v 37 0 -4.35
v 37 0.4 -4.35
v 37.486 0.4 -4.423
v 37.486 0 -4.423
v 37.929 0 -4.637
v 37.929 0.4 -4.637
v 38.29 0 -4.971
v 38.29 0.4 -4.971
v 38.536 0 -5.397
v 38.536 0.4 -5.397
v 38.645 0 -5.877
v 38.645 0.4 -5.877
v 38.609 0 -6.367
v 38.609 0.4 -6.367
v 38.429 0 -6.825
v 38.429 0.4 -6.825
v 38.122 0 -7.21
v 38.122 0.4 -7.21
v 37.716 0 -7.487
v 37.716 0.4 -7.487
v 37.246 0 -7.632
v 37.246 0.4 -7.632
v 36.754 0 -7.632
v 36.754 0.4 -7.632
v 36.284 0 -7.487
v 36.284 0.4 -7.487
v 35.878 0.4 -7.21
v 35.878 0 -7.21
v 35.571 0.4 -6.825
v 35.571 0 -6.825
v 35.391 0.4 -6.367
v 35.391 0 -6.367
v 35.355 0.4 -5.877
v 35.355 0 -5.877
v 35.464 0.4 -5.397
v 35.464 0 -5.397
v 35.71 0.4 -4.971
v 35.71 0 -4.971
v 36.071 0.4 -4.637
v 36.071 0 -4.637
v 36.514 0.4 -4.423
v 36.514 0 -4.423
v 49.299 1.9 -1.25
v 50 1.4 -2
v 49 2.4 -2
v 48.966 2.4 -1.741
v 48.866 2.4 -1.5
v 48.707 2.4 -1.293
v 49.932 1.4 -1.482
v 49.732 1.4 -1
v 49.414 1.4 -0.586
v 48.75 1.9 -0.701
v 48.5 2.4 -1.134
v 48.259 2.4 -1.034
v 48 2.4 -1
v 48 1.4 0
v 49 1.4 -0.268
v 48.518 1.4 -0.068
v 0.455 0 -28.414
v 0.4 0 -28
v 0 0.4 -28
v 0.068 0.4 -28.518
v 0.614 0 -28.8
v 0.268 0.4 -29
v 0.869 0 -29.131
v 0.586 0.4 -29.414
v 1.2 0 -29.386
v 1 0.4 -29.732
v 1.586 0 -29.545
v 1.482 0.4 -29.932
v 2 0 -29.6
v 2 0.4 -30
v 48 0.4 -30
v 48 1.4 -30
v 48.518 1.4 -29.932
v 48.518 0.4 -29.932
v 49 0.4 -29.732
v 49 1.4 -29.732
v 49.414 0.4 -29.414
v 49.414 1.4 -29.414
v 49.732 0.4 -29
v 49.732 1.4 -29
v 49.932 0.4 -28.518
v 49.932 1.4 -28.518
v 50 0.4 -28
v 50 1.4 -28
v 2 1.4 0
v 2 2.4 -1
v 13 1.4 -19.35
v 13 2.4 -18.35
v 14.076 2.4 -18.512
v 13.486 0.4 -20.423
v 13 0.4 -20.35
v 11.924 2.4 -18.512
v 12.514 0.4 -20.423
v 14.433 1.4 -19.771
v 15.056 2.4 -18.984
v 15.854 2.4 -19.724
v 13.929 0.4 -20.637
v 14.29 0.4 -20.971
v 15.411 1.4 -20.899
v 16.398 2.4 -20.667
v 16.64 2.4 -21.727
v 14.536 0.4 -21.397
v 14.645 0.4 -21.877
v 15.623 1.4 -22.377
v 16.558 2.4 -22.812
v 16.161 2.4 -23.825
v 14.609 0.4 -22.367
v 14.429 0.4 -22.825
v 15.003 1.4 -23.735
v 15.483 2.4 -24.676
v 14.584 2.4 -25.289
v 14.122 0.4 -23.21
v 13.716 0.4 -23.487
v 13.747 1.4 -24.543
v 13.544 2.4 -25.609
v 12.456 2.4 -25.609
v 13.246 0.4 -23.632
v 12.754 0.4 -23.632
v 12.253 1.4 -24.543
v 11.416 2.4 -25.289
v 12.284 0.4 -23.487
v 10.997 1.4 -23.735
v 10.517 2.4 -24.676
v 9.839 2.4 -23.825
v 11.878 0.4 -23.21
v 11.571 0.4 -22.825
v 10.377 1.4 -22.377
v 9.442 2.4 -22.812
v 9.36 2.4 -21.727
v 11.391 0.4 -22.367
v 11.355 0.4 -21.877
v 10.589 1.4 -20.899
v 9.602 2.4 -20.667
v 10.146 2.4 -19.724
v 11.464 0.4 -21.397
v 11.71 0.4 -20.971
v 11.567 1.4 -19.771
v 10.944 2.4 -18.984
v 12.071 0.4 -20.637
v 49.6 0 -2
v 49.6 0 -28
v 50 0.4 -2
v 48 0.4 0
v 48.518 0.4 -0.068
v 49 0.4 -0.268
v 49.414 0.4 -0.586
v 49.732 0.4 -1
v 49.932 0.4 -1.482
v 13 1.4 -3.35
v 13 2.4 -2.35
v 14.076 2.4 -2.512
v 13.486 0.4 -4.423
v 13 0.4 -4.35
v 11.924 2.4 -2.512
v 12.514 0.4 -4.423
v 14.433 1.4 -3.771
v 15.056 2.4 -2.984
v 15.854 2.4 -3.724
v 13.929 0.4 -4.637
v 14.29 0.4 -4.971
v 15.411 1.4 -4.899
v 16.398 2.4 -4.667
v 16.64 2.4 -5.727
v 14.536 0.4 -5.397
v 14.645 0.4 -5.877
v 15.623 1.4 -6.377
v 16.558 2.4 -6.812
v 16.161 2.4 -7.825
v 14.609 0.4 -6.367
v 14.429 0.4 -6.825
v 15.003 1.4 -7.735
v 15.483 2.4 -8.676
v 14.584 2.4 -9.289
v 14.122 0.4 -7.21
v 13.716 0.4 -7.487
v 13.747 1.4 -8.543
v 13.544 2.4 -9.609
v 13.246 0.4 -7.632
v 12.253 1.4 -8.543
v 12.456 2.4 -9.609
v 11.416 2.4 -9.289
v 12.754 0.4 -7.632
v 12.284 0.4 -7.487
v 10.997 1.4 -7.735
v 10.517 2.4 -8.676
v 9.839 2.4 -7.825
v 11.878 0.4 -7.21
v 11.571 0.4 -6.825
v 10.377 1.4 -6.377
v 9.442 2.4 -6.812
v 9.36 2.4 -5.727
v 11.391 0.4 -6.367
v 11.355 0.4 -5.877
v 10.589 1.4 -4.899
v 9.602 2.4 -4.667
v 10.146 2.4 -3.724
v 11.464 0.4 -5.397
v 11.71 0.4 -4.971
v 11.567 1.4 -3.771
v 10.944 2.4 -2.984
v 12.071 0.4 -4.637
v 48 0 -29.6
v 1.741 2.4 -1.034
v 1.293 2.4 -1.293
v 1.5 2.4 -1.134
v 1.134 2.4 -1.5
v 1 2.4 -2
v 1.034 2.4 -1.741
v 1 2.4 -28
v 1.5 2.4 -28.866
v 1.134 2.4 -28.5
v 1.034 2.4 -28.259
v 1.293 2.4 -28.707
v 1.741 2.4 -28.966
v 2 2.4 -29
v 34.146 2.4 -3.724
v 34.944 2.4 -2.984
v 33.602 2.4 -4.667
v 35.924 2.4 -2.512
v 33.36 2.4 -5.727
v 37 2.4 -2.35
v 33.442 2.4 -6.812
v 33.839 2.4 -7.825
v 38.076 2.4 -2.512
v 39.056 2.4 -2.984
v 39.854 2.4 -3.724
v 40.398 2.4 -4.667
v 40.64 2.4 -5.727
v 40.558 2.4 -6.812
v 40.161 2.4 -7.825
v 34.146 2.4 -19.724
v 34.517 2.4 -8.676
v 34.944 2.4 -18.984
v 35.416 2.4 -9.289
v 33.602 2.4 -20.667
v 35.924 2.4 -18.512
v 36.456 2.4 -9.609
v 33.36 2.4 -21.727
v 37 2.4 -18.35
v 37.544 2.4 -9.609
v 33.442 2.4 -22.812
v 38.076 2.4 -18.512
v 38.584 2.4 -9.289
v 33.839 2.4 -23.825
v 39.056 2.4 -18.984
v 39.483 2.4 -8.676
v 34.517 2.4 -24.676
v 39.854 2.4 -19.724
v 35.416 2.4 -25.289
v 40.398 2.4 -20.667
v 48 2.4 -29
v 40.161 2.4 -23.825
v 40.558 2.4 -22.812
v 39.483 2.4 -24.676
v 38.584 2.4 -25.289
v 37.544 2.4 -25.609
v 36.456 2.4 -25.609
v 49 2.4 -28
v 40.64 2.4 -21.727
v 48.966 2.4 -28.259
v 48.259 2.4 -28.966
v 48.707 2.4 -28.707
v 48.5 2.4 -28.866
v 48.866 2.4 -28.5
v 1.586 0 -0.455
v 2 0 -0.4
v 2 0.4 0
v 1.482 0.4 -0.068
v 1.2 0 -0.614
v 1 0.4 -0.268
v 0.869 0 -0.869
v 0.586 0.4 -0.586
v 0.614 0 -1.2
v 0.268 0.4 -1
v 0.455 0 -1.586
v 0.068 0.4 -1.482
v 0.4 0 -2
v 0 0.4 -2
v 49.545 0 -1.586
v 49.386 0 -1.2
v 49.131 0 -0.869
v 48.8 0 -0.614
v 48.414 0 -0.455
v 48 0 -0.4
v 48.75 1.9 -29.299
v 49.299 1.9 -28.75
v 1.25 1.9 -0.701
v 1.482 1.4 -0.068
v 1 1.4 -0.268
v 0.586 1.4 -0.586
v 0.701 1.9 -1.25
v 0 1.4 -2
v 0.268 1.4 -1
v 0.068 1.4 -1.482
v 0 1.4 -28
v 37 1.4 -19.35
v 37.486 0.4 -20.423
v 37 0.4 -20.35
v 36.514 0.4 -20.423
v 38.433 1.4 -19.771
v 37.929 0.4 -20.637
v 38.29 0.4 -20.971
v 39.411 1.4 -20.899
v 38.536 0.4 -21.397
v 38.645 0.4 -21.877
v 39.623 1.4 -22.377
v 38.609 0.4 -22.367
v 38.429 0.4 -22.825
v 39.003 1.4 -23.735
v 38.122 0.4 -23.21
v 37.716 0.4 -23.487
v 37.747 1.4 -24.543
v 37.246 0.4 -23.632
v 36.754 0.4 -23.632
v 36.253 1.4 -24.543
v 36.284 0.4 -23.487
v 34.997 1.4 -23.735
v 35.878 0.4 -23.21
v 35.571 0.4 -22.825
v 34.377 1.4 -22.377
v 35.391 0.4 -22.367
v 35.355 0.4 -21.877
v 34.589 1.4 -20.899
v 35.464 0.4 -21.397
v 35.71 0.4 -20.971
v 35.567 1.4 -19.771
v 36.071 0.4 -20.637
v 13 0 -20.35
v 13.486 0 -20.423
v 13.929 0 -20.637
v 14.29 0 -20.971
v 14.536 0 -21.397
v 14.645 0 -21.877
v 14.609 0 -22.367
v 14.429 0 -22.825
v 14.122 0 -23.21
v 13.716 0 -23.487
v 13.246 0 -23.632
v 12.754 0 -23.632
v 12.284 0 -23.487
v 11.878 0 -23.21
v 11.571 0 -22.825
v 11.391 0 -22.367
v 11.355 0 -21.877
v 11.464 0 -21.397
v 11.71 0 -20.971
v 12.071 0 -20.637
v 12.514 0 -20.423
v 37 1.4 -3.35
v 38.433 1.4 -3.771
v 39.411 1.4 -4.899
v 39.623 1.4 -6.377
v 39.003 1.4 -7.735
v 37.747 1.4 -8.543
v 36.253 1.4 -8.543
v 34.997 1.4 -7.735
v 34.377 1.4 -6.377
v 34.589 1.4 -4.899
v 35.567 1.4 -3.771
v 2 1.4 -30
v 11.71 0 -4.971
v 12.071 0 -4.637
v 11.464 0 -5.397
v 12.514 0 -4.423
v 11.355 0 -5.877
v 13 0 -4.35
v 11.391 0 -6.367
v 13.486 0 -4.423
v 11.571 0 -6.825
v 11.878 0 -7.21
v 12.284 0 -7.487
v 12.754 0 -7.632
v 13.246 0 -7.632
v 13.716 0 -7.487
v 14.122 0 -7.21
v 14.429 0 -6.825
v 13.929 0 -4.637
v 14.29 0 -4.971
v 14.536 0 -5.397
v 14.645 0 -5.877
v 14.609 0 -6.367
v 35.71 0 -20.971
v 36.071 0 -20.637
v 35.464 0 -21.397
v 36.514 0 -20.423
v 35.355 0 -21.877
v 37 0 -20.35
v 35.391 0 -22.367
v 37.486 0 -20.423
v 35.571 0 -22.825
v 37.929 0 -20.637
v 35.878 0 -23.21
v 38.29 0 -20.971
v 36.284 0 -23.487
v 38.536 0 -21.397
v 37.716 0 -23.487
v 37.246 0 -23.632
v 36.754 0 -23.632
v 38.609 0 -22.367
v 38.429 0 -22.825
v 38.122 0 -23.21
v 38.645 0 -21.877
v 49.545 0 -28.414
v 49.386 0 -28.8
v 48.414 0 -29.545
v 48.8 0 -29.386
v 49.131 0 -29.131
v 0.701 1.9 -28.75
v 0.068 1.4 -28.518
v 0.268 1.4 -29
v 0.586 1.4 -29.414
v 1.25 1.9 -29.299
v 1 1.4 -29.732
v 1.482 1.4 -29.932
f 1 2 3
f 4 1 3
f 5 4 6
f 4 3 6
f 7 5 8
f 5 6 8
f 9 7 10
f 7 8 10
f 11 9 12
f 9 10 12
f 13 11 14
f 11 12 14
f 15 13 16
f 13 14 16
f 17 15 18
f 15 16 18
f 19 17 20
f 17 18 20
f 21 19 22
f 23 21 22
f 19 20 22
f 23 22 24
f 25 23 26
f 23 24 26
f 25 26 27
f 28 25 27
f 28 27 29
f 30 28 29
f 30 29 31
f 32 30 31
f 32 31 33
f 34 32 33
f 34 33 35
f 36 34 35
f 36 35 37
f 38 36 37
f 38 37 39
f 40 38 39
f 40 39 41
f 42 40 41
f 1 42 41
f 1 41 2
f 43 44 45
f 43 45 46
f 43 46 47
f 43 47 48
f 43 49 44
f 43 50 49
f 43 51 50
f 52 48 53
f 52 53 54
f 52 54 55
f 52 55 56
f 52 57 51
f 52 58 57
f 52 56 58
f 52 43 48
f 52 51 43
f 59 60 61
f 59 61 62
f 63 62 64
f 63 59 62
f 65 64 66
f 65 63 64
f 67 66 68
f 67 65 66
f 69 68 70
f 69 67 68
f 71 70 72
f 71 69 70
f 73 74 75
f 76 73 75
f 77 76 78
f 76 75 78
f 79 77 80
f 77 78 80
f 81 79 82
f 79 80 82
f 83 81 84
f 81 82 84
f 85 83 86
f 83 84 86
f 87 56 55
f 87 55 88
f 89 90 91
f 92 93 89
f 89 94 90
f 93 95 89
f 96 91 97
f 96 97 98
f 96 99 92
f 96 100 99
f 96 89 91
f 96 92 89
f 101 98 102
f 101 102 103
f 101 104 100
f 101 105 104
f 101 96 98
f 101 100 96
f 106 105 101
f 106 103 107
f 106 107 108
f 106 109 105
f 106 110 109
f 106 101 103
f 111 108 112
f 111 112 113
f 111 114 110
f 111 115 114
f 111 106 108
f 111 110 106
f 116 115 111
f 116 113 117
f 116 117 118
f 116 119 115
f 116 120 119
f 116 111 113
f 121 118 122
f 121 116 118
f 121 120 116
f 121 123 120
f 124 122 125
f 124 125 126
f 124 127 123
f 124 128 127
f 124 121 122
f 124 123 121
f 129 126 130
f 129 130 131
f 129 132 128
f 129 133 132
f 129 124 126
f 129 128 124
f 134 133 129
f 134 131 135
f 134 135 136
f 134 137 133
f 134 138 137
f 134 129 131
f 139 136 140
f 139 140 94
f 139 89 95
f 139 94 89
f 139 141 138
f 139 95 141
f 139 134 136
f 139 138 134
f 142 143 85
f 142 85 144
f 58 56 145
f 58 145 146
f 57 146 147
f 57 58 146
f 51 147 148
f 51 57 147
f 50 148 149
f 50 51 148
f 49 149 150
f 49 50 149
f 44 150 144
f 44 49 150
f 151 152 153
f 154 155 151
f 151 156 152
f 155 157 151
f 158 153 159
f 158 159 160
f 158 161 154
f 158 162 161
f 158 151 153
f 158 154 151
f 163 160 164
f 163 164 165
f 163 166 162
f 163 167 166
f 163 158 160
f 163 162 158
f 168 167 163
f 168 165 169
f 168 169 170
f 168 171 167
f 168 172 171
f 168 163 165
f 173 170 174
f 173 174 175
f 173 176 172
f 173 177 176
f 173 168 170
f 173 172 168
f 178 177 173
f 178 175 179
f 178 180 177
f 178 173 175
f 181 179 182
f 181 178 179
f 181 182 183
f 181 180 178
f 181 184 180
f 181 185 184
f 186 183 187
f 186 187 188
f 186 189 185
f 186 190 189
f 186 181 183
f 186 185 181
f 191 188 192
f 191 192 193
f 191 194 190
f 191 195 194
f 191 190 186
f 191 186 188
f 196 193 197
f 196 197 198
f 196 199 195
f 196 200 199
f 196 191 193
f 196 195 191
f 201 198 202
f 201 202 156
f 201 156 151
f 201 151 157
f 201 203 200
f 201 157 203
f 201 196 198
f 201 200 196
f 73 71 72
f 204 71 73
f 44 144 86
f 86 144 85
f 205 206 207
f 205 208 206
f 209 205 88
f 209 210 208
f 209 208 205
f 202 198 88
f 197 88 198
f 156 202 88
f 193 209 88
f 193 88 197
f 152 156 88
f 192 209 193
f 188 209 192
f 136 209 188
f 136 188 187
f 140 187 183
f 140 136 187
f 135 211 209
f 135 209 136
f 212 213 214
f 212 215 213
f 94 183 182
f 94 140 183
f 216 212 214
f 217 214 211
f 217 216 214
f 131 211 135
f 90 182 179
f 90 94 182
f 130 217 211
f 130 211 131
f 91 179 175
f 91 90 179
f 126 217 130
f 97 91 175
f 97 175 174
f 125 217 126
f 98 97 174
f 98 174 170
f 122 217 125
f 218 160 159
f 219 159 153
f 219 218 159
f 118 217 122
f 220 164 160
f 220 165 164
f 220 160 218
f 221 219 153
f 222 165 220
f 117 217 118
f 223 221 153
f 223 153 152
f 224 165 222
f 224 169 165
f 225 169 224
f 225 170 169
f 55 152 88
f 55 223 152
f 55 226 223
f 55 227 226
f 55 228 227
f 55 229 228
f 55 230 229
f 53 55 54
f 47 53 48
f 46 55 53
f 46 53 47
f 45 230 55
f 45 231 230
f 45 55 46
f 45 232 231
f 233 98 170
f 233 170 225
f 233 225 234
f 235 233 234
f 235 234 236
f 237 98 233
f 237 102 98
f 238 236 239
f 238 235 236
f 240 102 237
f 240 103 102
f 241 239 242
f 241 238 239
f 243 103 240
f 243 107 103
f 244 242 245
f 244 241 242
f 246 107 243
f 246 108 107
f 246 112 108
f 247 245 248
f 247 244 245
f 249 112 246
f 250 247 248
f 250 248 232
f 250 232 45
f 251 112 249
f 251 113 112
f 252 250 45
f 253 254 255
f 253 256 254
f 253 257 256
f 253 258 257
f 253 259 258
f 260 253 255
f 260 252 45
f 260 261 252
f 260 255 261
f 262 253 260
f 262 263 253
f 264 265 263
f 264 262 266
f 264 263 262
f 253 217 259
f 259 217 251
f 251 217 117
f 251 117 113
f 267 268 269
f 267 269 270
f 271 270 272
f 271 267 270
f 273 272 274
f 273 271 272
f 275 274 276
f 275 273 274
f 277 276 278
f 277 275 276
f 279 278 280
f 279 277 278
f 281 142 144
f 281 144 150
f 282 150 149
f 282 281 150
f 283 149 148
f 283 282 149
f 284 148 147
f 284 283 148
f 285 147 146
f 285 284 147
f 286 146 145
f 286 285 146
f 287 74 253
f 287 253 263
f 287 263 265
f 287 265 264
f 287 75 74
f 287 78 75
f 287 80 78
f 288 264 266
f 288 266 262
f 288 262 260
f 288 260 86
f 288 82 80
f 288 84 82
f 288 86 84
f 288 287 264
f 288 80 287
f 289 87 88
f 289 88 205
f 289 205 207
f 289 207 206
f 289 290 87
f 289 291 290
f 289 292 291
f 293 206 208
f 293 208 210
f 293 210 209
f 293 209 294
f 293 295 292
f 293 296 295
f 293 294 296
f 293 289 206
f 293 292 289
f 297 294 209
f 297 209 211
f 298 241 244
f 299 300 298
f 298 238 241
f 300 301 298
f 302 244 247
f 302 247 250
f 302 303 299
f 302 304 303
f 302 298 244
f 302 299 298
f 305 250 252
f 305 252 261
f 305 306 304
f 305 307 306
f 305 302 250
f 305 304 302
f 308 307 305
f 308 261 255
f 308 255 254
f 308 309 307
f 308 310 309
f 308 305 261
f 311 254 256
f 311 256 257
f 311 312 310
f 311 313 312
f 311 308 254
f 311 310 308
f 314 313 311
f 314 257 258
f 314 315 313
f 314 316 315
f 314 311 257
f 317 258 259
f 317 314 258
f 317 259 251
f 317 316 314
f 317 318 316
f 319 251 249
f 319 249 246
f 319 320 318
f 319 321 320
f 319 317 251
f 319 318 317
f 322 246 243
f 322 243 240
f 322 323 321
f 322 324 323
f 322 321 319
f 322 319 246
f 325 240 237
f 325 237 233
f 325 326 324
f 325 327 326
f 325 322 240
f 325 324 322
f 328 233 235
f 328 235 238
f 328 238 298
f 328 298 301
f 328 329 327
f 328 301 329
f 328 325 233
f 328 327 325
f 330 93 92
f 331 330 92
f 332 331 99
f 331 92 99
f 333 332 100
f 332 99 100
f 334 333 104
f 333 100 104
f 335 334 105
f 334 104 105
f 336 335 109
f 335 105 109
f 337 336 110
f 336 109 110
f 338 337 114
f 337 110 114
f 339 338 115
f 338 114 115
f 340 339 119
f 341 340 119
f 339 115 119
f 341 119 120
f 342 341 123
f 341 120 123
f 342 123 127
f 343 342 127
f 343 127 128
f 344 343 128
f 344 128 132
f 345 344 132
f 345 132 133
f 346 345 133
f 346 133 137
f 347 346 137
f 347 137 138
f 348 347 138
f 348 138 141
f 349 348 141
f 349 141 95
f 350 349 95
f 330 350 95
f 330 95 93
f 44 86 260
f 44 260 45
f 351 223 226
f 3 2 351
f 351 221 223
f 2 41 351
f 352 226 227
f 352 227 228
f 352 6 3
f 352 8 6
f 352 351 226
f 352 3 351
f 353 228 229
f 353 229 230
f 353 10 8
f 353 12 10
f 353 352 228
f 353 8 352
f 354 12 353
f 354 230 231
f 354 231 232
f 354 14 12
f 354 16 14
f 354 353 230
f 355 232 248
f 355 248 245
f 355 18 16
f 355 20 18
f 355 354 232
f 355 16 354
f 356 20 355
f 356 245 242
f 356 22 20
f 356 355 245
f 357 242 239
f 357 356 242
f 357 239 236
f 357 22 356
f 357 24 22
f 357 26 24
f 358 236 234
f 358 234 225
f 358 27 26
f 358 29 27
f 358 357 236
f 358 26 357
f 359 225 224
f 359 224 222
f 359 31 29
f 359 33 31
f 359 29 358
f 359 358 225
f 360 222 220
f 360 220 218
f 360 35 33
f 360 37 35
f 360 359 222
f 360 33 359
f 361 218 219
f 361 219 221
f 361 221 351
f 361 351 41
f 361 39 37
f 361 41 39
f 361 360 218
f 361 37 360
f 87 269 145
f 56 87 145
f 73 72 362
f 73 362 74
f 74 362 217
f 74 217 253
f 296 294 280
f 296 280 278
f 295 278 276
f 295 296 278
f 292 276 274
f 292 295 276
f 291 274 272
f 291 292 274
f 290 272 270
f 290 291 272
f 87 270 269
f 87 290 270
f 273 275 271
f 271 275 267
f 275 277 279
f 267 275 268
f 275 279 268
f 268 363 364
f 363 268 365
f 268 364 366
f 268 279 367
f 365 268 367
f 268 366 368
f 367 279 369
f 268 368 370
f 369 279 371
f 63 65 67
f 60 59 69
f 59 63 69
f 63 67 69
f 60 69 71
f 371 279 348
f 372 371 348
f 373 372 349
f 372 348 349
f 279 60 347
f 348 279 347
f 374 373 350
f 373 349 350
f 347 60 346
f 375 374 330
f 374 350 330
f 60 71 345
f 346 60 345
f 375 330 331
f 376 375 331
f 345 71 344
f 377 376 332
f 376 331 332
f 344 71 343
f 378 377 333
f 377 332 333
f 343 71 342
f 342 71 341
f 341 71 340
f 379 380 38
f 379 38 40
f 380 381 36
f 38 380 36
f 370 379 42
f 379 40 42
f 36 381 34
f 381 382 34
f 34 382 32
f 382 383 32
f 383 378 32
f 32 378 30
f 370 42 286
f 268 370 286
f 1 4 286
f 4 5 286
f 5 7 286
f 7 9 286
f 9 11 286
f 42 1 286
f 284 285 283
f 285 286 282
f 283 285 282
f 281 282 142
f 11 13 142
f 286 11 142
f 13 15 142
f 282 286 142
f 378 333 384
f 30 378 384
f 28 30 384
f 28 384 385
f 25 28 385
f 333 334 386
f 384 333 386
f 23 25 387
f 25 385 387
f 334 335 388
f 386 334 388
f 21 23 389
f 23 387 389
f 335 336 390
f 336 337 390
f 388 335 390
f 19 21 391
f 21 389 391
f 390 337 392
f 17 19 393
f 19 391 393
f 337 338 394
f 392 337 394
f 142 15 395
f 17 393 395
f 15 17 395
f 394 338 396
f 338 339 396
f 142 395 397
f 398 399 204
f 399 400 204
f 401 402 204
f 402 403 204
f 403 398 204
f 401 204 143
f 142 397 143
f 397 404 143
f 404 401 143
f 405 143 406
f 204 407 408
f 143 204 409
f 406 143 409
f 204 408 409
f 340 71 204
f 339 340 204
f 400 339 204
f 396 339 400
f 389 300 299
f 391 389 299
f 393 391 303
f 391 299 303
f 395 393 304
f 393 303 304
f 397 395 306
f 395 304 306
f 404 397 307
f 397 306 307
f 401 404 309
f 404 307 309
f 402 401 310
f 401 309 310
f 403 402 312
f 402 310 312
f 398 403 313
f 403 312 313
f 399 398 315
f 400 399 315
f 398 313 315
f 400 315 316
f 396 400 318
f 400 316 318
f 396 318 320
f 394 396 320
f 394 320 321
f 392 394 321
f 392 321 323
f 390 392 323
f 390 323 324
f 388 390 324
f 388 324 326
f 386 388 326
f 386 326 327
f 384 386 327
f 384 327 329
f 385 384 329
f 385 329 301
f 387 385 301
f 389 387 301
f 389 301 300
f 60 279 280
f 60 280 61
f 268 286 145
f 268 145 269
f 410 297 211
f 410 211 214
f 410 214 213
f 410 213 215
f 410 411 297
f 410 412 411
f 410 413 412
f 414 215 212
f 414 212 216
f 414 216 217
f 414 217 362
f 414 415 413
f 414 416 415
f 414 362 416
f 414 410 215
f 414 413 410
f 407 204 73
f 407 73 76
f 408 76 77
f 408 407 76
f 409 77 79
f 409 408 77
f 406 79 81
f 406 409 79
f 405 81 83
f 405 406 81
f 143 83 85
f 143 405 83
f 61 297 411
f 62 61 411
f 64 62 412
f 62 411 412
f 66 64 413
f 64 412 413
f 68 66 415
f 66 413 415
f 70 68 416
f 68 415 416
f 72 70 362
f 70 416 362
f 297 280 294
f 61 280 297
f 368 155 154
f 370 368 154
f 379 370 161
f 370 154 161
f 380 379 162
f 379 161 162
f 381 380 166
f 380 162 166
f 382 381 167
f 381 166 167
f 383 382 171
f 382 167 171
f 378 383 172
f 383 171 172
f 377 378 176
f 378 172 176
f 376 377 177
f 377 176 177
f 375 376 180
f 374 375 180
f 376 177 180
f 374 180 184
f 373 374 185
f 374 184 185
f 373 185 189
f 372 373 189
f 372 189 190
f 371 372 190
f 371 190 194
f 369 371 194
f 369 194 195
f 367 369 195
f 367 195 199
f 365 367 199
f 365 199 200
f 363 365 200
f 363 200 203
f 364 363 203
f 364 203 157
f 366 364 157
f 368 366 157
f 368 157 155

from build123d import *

# Parameters (mm, degrees)
SKETCH_1_W          = 50
SKETCH_1_H          = 30
EXTRUDE_1_DEPTH     = 2.4
SKETCH_2_R          = 1.65
CUT_EXTRUDE_1_DEPTH = 59.35888964
CHAMFER_1_SIZE      = 2
FILLET_1_R          = 2
CHAMFER_2_SIZE      = 1
CHAMFER_3_SIZE      = 0.4


with BuildPart() as part:
    # 草图1 → 凸台-拉伸1 (new body)
    with BuildSketch(Plane(origin=(0, 0, 0), x_dir=(1, 0, 0), z_dir=(0, 1, 0))):
        with Locations((25, 15)):
            Rectangle(SKETCH_1_W, SKETCH_1_H)
    extrude(amount=EXTRUDE_1_DEPTH)

    # 草图2 → 切除-拉伸1 (cut, through all)
    with BuildSketch(Plane(origin=(0, 2.4, 0), x_dir=(1, 0, 0), z_dir=(0, 1, 0))):
        with Locations(Location((13, 6, 0), (0, 0, 270))):
            Circle(SKETCH_2_R)
        with Locations(Location((37, 6, 0), (0, 0, 270))):
            Circle(SKETCH_2_R)
        with Locations(Location((13, 22, 0), (0, 0, 270))):
            Circle(SKETCH_2_R)
        with Locations(Location((37, 22, 0), (0, 0, 270))):
            Circle(SKETCH_2_R)
    extrude(amount=-CUT_EXTRUDE_1_DEPTH, mode=Mode.SUBTRACT)

    # 倒角1
    chamfer_1_edges = [part.edges().sort_by_distance(p)[0] for p in [
        (13, 2.4, -7.65),
        (37, 2.4, -23.65),
        (37, 2.4, -7.65),
        (13, 2.4, -23.65),
    ]]
    chamfer(chamfer_1_edges, length=CHAMFER_1_SIZE)

    # 圆角1
    fillet_1_edges = [part.edges().sort_by_distance(p)[0] for p in [
        (0, 1.2, -30),
        (50, 1.2, -30),
        (50, 1.2, 0),
        (0, 1.2, 0),
    ]]
    fillet(fillet_1_edges, radius=FILLET_1_R)

    # 倒角2
    chamfer_2_edges = [part.edges().sort_by_distance(p)[0] for p in [
        (25, 2.4, -30),
        (50, 2.4, -15),
        (0, 2.4, -15),
        (25, 2.4, 0),
        (0.585786438, 2.4, -29.414213562),
        (0.585786438, 2.4, -0.585786438),
        (49.414213562, 2.4, -0.585786438),
        (49.414213562, 2.4, -29.414213562),
    ]]
    chamfer(chamfer_2_edges, length=CHAMFER_2_SIZE)

    # 倒角3
    chamfer_3_edges = [part.edges().sort_by_distance(p)[0] for p in [
        (25, 0, -30),
        (0, 0, -15),
        (50, 0, -15),
        (25, 0, 0),
        (0.585786438, 0, -29.414213562),
        (0.585786438, 0, -0.585786438),
        (49.414213562, 0, -0.585786438),
        (49.414213562, 0, -29.414213562),
    ]]
    chamfer(chamfer_3_edges, length=CHAMFER_3_SIZE)


solid = part.part
